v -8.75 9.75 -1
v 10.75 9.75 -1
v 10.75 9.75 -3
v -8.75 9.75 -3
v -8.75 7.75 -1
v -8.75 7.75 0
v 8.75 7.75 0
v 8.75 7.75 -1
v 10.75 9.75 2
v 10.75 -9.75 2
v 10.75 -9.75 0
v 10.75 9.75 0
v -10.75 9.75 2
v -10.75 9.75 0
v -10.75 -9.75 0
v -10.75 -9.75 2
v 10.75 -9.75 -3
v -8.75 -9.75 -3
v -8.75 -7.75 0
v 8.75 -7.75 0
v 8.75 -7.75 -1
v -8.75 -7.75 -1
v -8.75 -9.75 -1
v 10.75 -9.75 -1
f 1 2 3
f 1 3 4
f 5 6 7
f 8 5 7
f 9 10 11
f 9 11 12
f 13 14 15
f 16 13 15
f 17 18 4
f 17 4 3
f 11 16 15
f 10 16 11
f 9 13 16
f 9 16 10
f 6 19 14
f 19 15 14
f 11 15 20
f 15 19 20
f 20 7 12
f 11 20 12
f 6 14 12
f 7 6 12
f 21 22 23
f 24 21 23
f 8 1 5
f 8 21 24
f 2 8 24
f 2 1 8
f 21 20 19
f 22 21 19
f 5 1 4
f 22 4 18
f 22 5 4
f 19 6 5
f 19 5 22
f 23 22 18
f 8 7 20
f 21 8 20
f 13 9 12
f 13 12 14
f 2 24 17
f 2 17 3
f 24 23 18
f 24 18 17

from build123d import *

# Parameters (mm, degrees)
F0_W     = 17.5
F0_H     = 15.5
F1_DEPTH = 2
F2_DEPTH = 3
F3_DEPTH = 1


with BuildPart() as f1:
    # F0 (on Top) → F1 (new body)
    with BuildSketch(Plane.XY):
        Polygon((-8.75, -7.75), (-8.75, -9.75), (10.75, -9.75), (10.75, 9.75), (-8.75, 9.75), (-8.75, 7.75), (8.75, 7.75), (8.75, -7.75), align=None)
        Rectangle(F0_W, F0_H)
        Polygon((-10.75, 9.75), (-10.75, -9.75), (-8.75, -9.75), (-8.75, -7.75), (-8.75, 7.75), (-8.75, 9.75), align=None)
    extrude(amount=F1_DEPTH)

    # F0 (on Top) → F2 (join)
    with BuildSketch(Plane.XY):
        Rectangle(F0_W, F0_H)
        Polygon((-8.75, -7.75), (-8.75, -9.75), (10.75, -9.75), (10.75, 9.75), (-8.75, 9.75), (-8.75, 7.75), (8.75, 7.75), (8.75, -7.75), align=None)
    extrude(amount=-F2_DEPTH)

    # F0 (on Top) → F3 (cut)
    with BuildSketch(Plane.XY):
        Polygon((-8.75, -7.75), (-8.75, -9.75), (10.75, -9.75), (10.75, 9.75), (-8.75, 9.75), (-8.75, 7.75), (8.75, 7.75), (8.75, -7.75), align=None)
    extrude(amount=-F3_DEPTH, mode=Mode.SUBTRACT)


solid = f1.part
